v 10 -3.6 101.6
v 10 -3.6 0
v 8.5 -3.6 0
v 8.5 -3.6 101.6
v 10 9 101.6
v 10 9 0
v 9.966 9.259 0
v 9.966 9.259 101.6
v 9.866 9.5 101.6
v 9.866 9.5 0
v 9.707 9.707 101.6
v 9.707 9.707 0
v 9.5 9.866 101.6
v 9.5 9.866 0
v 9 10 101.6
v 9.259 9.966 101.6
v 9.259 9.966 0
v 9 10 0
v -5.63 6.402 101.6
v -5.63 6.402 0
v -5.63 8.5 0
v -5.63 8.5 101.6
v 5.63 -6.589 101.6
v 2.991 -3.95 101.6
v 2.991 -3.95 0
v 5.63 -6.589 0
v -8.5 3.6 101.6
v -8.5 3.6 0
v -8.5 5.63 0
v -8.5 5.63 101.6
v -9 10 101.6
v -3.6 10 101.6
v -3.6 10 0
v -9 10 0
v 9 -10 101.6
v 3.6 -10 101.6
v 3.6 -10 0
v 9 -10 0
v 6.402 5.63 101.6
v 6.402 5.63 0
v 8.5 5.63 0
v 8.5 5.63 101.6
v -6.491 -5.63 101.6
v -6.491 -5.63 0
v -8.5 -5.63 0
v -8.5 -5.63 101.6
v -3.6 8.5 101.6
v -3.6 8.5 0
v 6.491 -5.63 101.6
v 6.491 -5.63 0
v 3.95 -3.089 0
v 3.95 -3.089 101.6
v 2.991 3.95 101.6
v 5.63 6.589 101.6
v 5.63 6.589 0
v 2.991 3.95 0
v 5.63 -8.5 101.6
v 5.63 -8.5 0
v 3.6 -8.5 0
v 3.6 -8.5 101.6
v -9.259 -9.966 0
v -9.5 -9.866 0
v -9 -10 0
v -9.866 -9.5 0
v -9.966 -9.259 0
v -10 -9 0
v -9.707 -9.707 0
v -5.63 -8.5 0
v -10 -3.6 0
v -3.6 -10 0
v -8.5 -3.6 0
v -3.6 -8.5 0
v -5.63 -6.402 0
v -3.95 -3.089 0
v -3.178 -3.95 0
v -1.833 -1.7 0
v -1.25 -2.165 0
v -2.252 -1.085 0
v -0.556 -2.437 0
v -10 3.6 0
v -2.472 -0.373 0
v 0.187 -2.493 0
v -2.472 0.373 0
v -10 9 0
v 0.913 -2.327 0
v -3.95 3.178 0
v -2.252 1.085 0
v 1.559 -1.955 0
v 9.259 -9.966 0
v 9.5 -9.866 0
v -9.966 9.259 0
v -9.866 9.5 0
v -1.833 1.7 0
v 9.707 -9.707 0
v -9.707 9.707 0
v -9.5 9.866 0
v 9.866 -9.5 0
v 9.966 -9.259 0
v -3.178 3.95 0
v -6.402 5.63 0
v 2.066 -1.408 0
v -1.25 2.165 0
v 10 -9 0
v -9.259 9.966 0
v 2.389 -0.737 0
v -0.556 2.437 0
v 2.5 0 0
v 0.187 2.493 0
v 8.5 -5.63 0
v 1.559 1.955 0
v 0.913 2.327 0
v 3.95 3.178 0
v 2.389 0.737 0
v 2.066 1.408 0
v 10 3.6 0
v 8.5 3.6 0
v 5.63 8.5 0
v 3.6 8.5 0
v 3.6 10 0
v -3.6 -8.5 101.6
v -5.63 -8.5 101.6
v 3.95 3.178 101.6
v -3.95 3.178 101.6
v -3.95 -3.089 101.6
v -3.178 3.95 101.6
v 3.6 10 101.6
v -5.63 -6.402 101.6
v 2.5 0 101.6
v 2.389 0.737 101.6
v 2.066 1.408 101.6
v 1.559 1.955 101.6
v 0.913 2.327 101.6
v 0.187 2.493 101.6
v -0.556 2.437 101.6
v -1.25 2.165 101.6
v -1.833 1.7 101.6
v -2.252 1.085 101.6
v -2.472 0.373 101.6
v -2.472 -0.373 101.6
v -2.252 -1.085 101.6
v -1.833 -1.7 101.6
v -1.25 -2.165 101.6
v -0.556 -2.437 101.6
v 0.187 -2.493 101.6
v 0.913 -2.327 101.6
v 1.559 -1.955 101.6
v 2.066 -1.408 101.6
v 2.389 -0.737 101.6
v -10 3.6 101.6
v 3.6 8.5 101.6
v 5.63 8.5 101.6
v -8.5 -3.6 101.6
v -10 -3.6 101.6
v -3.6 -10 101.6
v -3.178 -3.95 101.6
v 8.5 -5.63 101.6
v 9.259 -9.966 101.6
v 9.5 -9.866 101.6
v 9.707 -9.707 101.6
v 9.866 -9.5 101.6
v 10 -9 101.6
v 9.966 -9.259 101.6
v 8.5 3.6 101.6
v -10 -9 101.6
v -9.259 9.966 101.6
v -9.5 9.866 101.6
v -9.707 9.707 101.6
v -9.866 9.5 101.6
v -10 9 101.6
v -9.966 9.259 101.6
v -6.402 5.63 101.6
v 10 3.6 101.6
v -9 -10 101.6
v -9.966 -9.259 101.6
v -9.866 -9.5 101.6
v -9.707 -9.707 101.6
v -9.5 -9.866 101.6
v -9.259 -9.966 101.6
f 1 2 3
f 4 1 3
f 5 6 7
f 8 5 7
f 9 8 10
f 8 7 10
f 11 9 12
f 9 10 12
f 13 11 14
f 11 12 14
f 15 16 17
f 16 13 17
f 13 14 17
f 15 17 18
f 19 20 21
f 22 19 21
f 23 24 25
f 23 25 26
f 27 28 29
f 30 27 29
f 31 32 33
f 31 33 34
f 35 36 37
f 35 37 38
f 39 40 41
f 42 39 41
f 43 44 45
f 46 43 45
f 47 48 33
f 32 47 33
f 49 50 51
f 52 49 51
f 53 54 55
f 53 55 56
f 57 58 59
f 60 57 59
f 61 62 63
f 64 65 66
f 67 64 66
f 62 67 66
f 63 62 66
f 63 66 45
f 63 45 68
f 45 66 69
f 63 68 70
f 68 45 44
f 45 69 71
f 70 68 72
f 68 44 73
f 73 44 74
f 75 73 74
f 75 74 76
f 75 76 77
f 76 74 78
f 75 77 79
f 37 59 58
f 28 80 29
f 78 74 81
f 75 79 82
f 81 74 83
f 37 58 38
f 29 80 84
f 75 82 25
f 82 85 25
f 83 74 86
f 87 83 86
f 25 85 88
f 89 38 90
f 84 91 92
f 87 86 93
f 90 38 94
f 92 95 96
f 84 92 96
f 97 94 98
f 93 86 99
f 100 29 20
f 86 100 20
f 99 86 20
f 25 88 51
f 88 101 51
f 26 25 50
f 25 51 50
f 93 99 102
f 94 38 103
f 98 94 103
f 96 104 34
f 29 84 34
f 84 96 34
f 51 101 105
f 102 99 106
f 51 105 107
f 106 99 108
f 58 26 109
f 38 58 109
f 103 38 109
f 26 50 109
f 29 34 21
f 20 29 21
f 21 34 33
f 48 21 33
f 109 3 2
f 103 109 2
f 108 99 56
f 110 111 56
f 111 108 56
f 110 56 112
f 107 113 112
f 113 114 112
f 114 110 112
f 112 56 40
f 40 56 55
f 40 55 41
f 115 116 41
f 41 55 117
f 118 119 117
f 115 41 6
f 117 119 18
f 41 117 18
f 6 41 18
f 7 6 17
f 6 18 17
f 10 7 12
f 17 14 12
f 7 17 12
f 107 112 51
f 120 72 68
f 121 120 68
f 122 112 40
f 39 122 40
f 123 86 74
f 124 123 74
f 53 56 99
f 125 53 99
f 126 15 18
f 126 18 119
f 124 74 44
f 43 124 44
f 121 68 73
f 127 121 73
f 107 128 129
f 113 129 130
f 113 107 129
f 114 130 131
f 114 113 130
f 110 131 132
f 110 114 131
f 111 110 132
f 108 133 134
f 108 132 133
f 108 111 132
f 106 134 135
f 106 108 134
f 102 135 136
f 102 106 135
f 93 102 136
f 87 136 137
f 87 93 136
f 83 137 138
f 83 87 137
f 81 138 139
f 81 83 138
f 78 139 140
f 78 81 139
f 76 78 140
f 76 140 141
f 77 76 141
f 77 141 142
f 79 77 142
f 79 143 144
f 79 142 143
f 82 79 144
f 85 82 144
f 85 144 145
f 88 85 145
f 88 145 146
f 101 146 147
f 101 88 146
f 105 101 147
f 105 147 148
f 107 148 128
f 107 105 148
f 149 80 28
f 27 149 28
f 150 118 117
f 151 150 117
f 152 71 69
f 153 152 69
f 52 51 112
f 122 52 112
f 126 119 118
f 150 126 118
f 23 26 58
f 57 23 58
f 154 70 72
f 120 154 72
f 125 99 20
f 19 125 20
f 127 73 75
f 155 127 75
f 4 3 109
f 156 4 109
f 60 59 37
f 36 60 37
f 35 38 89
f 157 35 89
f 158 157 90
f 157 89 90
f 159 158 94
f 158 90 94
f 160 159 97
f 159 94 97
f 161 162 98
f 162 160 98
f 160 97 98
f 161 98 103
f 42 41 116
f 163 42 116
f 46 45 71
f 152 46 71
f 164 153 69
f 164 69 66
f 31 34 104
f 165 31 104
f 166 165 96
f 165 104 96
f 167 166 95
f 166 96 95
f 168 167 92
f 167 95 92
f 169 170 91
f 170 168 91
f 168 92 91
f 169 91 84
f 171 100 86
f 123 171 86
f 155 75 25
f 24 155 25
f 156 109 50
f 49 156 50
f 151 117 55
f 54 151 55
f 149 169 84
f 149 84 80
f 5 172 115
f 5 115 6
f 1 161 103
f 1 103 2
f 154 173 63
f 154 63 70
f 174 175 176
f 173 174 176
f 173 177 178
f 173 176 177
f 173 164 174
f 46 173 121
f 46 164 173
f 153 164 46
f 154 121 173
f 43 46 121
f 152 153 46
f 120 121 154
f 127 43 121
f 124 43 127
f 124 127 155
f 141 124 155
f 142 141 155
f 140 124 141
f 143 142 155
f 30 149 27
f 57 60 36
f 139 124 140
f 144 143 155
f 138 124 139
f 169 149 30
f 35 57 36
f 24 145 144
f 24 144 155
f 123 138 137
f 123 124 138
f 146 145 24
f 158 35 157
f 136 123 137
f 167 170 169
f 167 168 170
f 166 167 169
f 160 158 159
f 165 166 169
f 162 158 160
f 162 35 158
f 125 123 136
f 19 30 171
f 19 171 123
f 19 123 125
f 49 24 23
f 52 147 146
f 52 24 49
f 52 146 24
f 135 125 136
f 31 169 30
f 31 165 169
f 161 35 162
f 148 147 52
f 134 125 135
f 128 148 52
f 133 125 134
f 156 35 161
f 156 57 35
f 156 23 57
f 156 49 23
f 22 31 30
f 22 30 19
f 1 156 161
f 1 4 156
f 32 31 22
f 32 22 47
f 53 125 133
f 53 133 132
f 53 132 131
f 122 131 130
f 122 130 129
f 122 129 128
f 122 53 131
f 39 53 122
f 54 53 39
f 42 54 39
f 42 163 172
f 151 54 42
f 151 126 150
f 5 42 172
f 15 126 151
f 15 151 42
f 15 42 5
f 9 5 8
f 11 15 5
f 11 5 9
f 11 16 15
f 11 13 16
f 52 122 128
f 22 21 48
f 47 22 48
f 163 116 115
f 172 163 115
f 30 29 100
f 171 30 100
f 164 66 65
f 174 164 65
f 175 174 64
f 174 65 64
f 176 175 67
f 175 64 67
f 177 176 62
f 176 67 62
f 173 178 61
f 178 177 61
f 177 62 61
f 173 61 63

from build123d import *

# Parameters (mm, degrees)
SKETCH1_R           = 2.5
BOSS_EXTRUDE1_DEPTH = 482.6
SKETCH2_W           = 35.989521226
SKETCH2_H           = 397.523683421
CUT_EXTRUDE1_DEPTH  = 21


with BuildPart() as part:
    # Sketch1 → Boss-Extrude1 (new body)
    with BuildSketch(Plane.XY):
        with BuildLine():
            Line((-5.63, 10), (-9, 10))
            ThreePointArc((-9, 10), (-9.707106781, 9.707106781), (-10, 9))
            Line((-10, 9), (-10, 5.63))
            Line((-10, 5.63), (-10, 3.6))
            Line((-10, 3.6), (-8.5, 3.6))
            Line((-8.5, 3.6), (-8.5, 5.63))
            Line((-8.5, 5.63), (-6.402046573, 5.63))
            Line((-6.402046573, 5.63), (-3.95, 3.177953427))
            Line((-3.95, 3.177953427), (-3.95, -3.088580227))
            Line((-3.95, -3.088580227), (-6.491419773, -5.63))
            Line((-6.491419773, -5.63), (-8.5, -5.63))
            Line((-8.5, -5.63), (-8.5, -3.6))
            Line((-8.5, -3.6), (-10, -3.6))
            Line((-10, -3.6), (-10, -5.63))
            Line((-10, -5.63), (-10, -9))
            ThreePointArc((-10, -9), (-9.707106781, -9.707106781), (-9, -10))
            Line((-9, -10), (-5.63, -10))
            Line((-5.63, -10), (-3.6, -10))
            Line((-3.6, -10), (-3.6, -8.5))
            Line((-3.6, -8.5), (-5.63, -8.5))
            Line((-5.63, -8.5), (-5.63, -6.402046573))
            Line((-5.63, -6.402046573), (-3.177953427, -3.95))
            Line((-3.177953427, -3.95), (2.991333041, -3.95))
            Line((2.991333041, -3.95), (5.63, -6.588666959))
            Line((5.63, -6.588666959), (5.63, -8.5))
            Line((5.63, -8.5), (3.6, -8.5))
            Line((3.6, -8.5), (3.6, -10))
            Line((3.6, -10), (5.63, -10))
            Line((5.63, -10), (9, -10))
            ThreePointArc((9, -10), (9.707106781, -9.707106781), (10, -9))
            Line((10, -9), (10, -5.63))
            Line((10, -5.63), (10, -3.6))
            Line((10, -3.6), (8.5, -3.6))
            Line((8.5, -3.6), (8.5, -5.63))
            Line((8.5, -5.63), (6.491419773, -5.63))
            Line((6.491419773, -5.63), (3.95, -3.088580227))
            Line((3.95, -3.088580227), (3.95, 3.177953427))
            Line((3.95, 3.177953427), (6.402046573, 5.63))
            Line((6.402046573, 5.63), (8.5, 5.63))
            Line((8.5, 5.63), (8.5, 3.6))
            Line((8.5, 3.6), (10, 3.6))
            Line((10, 3.6), (10, 5.63))
            Line((10, 5.63), (10, 9))
            ThreePointArc((10, 9), (9.707106781, 9.707106781), (9, 10))
            Line((9, 10), (5.63, 10))
            Line((5.63, 10), (3.6, 10))
            Line((3.6, 10), (3.6, 8.5))
            Line((3.6, 8.5), (5.63, 8.5))
            Line((5.63, 8.5), (5.63, 6.588666959))
            Line((5.63, 6.588666959), (2.991333041, 3.95))
            Line((2.991333041, 3.95), (-3.177953427, 3.95))
            Line((-3.177953427, 3.95), (-5.63, 6.402046573))
            Line((-5.63, 6.402046573), (-5.63, 8.5))
            Line((-5.63, 8.5), (-3.6, 8.5))
            Line((-3.6, 8.5), (-3.6, 10))
            Line((-3.6, 10), (-5.63, 10))
        make_face()
        Circle(SKETCH1_R, mode=Mode.SUBTRACT)
    extrude(amount=BOSS_EXTRUDE1_DEPTH)

    # Sketch2 → Cut-Extrude1 (cut, through all)
    with BuildSketch(Plane(origin=(0, 10, 0), x_dir=(1, 0, 0), z_dir=(0, 1, 0))):
        with Locations((3.85907628, -300.361841711)):
            Rectangle(SKETCH2_W, SKETCH2_H)
    extrude(amount=-CUT_EXTRUDE1_DEPTH, mode=Mode.SUBTRACT)


solid = part.part
